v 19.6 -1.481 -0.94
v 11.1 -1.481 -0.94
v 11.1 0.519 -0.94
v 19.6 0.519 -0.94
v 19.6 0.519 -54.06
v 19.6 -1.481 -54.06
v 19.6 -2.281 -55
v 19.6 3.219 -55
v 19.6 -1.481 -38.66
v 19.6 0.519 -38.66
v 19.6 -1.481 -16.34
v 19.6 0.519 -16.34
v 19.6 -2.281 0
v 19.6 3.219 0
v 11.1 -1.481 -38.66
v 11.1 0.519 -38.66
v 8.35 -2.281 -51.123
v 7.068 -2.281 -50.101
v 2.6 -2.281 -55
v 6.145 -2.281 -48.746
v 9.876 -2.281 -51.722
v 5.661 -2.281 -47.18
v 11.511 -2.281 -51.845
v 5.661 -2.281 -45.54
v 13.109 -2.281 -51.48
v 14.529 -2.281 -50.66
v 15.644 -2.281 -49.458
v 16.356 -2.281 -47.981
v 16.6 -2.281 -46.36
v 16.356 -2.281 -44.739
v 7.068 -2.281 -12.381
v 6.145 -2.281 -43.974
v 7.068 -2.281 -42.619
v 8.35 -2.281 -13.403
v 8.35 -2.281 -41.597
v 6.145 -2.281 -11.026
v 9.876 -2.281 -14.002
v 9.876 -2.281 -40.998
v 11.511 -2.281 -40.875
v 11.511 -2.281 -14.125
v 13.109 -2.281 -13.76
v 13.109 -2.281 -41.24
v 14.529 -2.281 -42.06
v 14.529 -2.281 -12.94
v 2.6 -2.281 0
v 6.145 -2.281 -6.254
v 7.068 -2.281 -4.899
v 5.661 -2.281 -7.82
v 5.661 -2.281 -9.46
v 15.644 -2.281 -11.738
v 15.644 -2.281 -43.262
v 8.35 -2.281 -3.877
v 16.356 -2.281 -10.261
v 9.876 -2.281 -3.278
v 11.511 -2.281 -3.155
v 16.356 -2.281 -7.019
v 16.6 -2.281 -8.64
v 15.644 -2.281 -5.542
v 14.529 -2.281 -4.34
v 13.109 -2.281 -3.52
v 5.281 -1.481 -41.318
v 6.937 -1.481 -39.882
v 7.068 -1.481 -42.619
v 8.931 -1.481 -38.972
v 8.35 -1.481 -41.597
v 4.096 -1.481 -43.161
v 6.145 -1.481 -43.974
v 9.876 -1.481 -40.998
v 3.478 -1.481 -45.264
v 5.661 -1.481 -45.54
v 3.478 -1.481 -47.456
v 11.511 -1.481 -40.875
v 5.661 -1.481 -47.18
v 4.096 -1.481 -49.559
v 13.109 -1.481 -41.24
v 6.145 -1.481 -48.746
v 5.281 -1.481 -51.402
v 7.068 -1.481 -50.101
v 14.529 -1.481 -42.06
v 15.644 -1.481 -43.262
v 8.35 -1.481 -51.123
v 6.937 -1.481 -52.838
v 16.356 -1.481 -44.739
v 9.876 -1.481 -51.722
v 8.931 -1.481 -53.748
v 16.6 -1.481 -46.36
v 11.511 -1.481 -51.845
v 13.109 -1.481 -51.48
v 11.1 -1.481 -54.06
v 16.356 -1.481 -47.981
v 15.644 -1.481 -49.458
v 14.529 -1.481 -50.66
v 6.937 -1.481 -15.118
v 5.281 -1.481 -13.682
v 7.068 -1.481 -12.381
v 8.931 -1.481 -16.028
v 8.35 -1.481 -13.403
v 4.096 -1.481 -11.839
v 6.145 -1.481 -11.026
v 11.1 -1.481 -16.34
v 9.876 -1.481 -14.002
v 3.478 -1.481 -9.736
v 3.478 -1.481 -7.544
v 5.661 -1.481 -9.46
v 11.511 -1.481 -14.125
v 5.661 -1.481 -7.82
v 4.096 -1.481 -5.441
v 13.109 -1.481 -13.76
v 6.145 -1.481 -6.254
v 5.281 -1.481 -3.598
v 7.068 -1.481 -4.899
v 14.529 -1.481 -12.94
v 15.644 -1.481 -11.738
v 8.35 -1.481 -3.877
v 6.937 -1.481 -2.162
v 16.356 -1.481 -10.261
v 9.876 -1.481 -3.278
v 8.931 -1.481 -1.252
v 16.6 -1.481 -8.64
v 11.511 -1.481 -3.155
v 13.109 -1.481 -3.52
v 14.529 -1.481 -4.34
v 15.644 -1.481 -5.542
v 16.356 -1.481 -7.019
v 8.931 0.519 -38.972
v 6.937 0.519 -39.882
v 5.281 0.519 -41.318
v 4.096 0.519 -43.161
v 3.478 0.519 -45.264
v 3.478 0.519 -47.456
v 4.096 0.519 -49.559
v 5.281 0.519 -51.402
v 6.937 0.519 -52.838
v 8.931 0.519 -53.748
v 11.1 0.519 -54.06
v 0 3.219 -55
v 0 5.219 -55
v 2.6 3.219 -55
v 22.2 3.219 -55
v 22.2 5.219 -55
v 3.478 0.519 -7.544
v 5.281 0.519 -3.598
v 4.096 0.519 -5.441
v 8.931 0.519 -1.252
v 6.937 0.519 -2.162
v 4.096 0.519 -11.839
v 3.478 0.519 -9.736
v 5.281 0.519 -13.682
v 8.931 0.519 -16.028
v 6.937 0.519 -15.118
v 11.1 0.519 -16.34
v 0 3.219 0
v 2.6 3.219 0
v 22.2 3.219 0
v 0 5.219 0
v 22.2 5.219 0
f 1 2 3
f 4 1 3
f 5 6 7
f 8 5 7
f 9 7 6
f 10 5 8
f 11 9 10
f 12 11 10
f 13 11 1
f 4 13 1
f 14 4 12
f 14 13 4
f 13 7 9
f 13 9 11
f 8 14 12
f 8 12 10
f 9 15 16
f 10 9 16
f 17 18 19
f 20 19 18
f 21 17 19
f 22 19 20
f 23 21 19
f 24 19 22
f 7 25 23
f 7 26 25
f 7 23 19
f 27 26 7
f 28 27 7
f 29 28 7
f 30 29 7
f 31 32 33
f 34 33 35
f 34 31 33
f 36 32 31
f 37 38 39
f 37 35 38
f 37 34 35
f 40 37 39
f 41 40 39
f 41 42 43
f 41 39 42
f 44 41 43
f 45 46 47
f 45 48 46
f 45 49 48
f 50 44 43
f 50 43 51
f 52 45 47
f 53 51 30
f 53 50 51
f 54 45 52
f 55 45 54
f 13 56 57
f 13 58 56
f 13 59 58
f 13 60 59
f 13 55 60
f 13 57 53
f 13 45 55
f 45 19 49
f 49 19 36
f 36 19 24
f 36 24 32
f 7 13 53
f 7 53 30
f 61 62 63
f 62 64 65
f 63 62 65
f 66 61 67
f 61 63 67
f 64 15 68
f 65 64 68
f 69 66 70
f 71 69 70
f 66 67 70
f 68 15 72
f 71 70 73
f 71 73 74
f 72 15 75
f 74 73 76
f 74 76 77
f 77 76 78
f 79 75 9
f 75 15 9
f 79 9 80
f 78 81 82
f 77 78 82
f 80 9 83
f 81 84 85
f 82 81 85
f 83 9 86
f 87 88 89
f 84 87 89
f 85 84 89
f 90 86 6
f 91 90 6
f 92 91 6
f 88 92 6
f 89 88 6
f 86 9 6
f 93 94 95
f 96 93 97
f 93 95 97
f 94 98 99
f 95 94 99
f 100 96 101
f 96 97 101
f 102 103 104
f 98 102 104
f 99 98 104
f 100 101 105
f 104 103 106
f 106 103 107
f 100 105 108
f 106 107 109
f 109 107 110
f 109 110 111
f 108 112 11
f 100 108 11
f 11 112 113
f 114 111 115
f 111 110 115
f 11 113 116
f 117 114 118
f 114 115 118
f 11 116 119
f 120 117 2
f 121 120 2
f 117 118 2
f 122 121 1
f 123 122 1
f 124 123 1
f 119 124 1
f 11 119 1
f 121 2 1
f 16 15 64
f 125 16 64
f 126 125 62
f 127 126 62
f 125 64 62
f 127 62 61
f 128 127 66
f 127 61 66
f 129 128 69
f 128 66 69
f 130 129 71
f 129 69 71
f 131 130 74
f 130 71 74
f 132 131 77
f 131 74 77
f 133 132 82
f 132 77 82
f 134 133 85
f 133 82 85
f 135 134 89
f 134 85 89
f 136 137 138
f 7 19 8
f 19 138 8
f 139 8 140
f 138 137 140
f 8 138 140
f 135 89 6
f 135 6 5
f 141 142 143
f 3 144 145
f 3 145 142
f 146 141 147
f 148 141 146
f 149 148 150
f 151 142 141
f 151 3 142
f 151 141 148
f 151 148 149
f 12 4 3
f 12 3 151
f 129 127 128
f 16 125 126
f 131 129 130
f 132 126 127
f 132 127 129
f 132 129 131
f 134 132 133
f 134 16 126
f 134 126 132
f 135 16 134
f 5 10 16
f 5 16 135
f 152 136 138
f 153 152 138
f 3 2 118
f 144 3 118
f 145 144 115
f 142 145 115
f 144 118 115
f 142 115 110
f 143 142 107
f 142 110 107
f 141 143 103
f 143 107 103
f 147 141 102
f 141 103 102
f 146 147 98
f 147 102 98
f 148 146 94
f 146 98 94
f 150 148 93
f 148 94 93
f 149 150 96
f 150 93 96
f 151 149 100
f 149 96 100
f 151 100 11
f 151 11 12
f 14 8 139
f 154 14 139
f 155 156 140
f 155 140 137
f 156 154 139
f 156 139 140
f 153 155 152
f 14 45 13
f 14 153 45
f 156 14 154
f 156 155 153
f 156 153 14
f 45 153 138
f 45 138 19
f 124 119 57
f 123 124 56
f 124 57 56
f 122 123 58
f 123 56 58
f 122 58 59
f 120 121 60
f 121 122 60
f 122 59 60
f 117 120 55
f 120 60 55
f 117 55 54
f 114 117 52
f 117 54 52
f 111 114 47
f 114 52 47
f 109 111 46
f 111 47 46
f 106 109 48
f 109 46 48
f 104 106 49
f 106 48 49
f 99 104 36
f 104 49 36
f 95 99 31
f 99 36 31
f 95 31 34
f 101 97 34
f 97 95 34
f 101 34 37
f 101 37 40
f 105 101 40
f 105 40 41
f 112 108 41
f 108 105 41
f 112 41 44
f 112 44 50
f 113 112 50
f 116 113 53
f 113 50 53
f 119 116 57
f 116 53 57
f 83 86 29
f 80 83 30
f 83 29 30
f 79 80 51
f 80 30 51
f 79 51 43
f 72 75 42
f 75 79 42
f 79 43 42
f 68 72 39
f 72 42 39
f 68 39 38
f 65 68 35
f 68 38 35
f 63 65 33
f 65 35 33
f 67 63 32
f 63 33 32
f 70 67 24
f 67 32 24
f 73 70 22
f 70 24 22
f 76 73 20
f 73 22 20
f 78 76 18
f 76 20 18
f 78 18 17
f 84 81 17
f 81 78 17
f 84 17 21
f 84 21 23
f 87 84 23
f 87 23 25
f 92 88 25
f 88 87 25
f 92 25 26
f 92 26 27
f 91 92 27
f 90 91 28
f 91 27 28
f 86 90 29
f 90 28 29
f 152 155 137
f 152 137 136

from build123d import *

# Parameters (mm, degrees)
BOSS_EXTRUDE1_DEPTH = 55
SKETCH3_R           = 7.7
CUT_EXTRUDE1_DEPTH  = 2.8
SKETCH4_R           = 7.7
SKETCH4_R_2         = 5.5
BOSS_EXTRUDE2_DEPTH = 0.8
SKETCH5_W           = 15.4
SKETCH5_H           = 2
CUT_EXTRUDE2_DEPTH  = 8.5


with BuildPart() as part:
    # Sketch2 → Boss-Extrude1 (new body)
    with BuildSketch(Plane.XY):
        Polygon((2.6, -2.280794077), (19.6, -2.280794077), (19.6, 3.219205923), (22.2, 3.219205923), (22.2, 5.219205923), (0, 5.219205923), (0, 3.219205923), (2.6, 3.219205923), align=None)
    extrude(amount=-BOSS_EXTRUDE1_DEPTH)

    # Sketch3 → Cut-Extrude1 (cut)
    with BuildSketch(Plane.XZ.offset(2.280794077)):
        with Locations((11.1, -8.64)):
            Circle(SKETCH3_R)
        with Locations((11.1, -46.36)):
            Circle(SKETCH3_R)
    extrude(amount=-CUT_EXTRUDE1_DEPTH, mode=Mode.SUBTRACT)

    # Sketch4 → Boss-Extrude2 (add)
    with BuildSketch(Plane.XZ.offset(2.280794077)):
        with Locations((11.1, -8.64)):
            Circle(SKETCH4_R)
        with Locations((11.1, -8.64)):
            Circle(SKETCH4_R_2, mode=Mode.SUBTRACT)
        with Locations((11.1, -46.36)):
            Circle(SKETCH4_R)
        with Locations((11.1, -46.36)):
            Circle(SKETCH4_R_2, mode=Mode.SUBTRACT)
    extrude(amount=-BOSS_EXTRUDE2_DEPTH)

    # Sketch5 → Cut-Extrude2 (cut)
    with BuildSketch(Plane(origin=(19.6, 0, 0), x_dir=(0, 0, -1), z_dir=(1, 0, 0))):
        with Locations((8.64, -0.480794077)):
            Rectangle(SKETCH5_W, SKETCH5_H)
        with Locations((46.36, -0.480794077)):
            Rectangle(SKETCH5_W, SKETCH5_H)
    extrude(amount=-CUT_EXTRUDE2_DEPTH, mode=Mode.SUBTRACT)


solid = part.part
